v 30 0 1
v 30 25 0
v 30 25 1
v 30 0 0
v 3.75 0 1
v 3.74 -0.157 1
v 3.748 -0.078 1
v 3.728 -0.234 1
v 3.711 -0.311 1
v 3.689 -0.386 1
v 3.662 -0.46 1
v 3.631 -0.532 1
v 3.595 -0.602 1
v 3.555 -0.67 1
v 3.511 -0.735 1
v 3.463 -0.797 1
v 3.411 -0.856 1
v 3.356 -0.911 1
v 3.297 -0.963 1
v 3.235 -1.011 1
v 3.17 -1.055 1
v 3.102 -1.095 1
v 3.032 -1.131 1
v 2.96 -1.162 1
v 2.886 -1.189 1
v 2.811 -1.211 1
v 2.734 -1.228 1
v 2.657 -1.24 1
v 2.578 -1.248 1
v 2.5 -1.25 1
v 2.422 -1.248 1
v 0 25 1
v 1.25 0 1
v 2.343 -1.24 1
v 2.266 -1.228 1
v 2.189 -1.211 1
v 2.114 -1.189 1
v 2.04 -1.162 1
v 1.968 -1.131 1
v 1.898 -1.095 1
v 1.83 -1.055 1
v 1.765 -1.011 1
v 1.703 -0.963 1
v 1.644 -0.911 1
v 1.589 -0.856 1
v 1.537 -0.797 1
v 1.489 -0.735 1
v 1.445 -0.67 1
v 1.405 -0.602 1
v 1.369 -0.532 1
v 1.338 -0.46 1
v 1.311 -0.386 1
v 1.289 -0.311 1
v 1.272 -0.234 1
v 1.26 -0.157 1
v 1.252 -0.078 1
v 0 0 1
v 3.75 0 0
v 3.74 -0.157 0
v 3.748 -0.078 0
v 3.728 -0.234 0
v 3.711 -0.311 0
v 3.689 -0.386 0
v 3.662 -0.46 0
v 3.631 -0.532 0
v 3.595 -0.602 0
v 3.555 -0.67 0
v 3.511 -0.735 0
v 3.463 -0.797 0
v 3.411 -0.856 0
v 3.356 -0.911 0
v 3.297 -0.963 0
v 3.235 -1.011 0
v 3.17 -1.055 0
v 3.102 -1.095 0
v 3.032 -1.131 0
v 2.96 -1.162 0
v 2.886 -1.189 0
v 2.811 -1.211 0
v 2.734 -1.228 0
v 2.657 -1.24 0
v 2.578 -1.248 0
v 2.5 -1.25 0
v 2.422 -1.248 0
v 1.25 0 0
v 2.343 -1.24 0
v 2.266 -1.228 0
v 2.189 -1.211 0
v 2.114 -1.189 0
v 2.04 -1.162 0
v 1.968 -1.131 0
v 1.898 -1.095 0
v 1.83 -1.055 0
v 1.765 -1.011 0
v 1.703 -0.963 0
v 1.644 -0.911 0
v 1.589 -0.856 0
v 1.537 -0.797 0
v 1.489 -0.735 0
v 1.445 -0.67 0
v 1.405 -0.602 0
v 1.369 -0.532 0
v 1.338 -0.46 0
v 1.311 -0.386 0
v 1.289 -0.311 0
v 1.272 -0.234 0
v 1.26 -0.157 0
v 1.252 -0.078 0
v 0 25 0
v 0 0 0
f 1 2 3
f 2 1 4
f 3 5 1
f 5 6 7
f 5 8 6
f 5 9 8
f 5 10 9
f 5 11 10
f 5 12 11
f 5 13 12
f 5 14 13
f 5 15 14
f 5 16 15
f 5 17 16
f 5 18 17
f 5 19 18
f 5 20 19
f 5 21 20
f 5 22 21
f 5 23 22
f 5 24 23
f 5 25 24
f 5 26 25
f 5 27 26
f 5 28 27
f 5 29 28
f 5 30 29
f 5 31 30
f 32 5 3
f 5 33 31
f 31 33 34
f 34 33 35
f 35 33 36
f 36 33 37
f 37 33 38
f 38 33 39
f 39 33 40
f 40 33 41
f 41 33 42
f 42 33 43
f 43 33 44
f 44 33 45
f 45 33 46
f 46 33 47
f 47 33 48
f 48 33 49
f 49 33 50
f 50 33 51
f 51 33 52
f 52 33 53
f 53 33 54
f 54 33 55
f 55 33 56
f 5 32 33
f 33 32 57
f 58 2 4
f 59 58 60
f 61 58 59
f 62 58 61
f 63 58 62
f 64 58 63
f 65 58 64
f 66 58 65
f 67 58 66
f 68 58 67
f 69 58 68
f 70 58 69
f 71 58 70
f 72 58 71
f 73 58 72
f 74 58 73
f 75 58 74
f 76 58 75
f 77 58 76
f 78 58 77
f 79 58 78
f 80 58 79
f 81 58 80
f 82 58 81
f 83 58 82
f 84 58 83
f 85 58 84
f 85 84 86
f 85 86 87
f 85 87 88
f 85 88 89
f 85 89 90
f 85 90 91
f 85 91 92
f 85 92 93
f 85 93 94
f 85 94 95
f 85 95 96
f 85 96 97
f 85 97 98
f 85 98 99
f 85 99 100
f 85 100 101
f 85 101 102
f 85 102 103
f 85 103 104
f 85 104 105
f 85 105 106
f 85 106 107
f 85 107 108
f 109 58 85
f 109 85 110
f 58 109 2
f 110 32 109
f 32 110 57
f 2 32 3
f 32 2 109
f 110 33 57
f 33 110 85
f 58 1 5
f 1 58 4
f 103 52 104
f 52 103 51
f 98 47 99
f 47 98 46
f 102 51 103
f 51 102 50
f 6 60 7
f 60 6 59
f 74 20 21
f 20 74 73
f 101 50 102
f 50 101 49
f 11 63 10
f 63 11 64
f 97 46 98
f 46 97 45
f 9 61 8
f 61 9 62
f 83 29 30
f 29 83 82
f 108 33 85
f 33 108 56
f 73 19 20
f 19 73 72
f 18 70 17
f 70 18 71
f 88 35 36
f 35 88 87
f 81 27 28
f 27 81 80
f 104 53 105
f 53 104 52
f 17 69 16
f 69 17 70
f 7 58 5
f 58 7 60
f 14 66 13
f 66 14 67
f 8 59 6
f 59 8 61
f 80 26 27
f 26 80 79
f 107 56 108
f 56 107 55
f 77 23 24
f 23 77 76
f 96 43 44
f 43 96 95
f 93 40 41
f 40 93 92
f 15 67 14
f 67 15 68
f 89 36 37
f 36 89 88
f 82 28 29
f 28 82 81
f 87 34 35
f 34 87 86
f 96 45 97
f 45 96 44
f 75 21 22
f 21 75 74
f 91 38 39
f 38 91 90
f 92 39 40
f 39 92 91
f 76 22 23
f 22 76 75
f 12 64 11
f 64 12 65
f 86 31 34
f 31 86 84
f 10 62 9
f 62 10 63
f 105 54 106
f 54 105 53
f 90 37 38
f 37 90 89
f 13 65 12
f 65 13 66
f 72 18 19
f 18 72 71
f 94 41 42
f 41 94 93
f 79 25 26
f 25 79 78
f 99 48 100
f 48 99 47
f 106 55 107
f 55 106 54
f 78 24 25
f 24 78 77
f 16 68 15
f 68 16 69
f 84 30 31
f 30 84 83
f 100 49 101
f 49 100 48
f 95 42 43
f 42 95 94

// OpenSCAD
module camera() {
    module groove() {
        cylinder(d=2.5, h=1, $fn=100);  
    }
    
    cube([30, 25, 1]);
    translate([2.5, 0, 0])
    groove();
}
camera();
